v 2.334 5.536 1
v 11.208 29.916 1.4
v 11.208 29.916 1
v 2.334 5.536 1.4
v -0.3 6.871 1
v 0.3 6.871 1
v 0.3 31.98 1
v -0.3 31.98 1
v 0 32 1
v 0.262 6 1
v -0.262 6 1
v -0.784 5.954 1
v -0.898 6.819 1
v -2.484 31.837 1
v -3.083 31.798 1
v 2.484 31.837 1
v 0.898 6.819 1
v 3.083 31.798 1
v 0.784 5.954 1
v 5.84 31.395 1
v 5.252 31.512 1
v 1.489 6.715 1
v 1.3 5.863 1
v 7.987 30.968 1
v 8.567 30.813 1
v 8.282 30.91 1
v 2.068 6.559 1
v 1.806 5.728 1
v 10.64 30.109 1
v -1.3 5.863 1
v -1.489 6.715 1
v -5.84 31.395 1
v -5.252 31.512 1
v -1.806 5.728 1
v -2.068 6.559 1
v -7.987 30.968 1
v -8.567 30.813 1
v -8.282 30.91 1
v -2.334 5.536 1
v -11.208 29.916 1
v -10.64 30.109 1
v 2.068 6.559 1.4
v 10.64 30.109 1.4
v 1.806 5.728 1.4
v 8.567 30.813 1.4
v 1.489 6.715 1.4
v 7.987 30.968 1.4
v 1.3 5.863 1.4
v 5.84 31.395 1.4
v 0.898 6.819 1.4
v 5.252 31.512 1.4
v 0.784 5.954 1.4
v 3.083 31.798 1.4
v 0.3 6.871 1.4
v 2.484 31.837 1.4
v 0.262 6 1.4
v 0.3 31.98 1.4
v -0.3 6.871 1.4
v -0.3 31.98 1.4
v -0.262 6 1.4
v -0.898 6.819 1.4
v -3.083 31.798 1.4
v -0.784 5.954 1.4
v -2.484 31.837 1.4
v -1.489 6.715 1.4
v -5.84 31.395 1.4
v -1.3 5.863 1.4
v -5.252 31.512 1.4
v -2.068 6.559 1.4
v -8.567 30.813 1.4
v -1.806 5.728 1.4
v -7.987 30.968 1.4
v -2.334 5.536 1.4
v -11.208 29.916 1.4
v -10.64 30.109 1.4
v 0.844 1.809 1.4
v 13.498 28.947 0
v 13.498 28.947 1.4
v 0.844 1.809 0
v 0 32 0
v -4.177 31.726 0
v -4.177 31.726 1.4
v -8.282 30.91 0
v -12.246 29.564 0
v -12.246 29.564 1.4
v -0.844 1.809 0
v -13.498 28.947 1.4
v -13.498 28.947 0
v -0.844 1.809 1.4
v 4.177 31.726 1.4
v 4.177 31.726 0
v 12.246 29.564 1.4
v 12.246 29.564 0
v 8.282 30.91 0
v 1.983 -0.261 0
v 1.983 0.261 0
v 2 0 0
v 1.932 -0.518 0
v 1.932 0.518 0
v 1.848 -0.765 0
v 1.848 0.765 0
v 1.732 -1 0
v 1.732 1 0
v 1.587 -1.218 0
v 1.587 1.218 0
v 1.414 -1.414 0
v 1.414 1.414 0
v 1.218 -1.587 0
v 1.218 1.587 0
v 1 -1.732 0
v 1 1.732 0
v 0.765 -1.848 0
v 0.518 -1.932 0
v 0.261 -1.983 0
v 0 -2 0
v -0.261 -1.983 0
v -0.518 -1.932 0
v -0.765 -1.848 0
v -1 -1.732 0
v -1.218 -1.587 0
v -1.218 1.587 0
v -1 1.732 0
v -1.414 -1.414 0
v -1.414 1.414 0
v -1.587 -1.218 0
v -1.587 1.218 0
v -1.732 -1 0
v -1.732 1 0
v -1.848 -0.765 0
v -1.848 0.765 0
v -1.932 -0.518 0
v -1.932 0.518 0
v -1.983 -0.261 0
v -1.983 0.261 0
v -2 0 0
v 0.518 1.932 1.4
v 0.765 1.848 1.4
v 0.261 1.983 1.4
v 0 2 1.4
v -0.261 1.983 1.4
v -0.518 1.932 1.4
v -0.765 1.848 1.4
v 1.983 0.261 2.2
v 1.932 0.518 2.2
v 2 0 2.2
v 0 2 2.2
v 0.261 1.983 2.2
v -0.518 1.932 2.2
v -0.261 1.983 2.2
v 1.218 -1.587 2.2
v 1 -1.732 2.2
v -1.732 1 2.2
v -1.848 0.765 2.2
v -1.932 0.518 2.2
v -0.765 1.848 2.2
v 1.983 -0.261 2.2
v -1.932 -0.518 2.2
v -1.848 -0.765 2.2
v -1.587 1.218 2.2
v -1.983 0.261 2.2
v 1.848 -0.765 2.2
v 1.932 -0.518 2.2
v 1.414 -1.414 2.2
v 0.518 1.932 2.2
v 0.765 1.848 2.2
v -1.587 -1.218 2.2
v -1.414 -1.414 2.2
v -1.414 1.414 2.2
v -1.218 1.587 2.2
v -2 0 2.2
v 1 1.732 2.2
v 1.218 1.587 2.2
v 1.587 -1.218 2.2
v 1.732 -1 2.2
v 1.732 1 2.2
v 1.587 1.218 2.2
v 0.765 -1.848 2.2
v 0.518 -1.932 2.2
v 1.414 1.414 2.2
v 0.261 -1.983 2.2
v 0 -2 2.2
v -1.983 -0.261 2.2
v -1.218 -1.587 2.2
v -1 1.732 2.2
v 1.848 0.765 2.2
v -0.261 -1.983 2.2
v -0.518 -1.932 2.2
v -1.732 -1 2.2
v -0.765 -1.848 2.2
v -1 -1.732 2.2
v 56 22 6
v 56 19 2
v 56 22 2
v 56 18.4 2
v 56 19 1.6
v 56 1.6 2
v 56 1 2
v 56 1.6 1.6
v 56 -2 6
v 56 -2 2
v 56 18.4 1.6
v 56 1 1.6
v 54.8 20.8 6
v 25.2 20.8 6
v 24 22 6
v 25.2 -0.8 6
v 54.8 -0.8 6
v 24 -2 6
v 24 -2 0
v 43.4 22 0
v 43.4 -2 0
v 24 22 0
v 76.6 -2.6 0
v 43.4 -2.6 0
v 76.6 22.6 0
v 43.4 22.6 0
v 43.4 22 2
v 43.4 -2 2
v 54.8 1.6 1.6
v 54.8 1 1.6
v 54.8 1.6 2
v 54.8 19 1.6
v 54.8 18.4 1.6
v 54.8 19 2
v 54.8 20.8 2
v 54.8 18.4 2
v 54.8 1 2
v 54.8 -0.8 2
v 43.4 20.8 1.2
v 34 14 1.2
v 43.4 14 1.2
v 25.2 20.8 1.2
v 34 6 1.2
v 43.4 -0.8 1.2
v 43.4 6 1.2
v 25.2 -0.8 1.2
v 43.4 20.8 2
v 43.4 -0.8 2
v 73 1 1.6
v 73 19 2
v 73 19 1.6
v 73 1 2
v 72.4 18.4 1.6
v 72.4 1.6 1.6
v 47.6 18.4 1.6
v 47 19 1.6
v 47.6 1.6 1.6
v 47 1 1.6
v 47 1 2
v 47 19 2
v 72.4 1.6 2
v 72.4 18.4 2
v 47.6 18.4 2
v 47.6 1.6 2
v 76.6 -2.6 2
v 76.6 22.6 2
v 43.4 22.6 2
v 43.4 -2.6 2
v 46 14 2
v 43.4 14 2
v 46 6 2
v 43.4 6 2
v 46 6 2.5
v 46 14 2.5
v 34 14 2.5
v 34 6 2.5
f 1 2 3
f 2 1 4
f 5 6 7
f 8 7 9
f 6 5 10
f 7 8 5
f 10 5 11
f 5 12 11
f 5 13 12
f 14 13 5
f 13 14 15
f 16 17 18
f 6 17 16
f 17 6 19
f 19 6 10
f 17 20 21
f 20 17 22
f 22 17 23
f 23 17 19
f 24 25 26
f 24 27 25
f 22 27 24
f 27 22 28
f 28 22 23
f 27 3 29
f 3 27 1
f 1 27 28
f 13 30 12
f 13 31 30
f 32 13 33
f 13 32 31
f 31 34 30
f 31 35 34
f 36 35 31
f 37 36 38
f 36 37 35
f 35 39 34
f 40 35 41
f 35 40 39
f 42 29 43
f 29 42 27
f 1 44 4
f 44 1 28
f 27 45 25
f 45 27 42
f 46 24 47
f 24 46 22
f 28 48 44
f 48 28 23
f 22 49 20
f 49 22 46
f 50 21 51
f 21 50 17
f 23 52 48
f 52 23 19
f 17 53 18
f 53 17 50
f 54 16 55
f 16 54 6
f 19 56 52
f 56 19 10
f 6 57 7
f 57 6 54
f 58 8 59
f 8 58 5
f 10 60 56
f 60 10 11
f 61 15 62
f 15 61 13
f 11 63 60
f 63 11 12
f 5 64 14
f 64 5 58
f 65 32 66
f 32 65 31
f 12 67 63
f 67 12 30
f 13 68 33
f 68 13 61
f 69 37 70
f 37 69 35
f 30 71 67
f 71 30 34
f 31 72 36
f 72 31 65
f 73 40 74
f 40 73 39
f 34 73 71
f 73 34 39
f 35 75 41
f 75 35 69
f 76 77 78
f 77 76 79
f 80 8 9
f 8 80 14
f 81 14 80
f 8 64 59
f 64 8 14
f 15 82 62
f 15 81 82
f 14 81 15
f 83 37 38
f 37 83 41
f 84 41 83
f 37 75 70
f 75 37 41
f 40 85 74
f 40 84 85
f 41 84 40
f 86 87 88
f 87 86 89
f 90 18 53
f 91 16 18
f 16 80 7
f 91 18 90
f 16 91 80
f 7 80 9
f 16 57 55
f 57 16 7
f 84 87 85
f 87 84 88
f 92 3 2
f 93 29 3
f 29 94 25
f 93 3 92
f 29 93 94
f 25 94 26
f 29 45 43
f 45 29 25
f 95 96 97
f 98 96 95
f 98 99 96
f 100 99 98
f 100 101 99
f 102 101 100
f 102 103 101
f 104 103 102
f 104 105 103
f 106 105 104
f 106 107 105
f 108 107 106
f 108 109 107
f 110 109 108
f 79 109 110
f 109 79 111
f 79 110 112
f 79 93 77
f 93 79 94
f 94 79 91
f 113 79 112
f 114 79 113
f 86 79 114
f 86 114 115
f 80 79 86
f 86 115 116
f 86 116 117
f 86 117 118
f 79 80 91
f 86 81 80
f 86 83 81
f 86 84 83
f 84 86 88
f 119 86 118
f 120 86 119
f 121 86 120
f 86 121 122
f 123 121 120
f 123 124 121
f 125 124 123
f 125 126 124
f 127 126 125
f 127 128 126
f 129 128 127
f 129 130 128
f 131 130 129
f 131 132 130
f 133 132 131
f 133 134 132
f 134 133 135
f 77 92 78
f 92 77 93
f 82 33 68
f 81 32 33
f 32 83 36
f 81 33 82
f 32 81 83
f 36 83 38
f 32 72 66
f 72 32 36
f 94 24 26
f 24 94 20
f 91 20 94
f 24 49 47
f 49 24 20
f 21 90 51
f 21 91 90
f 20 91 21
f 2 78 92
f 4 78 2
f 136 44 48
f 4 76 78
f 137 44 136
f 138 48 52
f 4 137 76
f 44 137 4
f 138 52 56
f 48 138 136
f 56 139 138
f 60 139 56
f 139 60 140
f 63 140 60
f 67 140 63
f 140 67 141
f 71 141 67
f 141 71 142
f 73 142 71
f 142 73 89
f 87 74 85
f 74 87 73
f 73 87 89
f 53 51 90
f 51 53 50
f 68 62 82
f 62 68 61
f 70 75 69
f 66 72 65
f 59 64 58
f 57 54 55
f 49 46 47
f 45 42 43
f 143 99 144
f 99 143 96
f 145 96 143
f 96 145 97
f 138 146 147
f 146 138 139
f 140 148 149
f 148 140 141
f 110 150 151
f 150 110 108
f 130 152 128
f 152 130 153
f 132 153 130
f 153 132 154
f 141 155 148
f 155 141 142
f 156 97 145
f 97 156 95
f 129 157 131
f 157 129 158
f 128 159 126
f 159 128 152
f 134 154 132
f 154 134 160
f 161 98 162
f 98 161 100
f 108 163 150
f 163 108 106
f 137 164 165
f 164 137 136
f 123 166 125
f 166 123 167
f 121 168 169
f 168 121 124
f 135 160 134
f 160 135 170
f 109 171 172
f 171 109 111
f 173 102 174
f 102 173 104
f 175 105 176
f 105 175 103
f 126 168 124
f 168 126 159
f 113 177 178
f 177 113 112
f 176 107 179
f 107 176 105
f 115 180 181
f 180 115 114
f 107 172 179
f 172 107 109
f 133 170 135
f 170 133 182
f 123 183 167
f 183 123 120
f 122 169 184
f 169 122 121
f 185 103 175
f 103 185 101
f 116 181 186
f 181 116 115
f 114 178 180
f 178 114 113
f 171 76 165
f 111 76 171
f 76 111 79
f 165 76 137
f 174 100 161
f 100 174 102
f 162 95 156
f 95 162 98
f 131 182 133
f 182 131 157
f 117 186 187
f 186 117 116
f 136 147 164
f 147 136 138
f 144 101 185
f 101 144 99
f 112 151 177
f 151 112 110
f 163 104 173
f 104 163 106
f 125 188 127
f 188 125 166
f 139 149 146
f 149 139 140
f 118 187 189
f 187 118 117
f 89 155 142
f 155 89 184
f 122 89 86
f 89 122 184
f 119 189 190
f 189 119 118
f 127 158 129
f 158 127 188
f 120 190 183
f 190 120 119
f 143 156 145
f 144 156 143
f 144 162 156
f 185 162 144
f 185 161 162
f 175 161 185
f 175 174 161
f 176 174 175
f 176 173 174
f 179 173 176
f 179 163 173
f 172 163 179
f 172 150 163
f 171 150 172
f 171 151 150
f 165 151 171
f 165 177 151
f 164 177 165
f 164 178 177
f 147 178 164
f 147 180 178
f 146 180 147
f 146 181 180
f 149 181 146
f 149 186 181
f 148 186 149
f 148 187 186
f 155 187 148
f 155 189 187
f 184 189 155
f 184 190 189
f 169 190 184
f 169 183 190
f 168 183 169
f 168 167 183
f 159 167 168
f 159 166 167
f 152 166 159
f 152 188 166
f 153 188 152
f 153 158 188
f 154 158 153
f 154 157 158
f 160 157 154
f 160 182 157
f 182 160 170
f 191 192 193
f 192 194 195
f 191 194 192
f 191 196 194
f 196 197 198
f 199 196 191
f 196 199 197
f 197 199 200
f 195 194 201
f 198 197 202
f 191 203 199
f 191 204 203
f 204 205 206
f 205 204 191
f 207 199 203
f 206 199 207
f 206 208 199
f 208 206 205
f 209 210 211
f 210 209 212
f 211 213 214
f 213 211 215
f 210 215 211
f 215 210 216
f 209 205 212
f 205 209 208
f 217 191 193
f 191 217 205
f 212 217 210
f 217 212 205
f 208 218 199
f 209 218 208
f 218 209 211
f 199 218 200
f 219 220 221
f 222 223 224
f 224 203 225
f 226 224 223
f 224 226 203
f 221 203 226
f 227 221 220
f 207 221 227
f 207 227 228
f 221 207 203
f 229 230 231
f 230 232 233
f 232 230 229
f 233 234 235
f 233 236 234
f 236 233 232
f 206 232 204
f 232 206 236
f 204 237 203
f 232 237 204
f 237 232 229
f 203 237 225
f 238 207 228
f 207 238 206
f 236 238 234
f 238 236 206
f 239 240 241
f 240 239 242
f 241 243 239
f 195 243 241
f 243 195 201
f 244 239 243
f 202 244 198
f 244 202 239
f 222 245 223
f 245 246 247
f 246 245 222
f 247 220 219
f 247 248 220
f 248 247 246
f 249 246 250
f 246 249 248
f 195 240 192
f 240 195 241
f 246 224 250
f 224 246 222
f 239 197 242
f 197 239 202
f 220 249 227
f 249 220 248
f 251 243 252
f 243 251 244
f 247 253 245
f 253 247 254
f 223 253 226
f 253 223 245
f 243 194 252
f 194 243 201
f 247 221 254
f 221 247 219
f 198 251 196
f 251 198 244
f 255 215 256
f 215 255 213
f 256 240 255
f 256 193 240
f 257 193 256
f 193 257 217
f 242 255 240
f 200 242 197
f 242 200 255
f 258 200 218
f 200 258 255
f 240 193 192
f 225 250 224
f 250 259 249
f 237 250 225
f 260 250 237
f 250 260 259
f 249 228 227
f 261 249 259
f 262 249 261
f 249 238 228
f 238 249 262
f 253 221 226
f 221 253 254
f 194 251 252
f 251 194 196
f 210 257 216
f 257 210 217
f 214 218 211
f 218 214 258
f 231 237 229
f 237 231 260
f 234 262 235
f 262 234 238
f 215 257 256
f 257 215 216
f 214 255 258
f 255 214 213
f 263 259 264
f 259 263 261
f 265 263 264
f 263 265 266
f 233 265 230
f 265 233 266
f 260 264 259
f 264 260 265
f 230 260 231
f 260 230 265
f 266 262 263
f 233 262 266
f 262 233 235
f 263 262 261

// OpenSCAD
// 小物：檜扇（ひおうぎ、男性用は白木・飾りなし）と硯箱（すずりばこ）
part = "plate";  // "hiougi" | "suzuribako" | "plate"

$fn = 48;

// 少し開いた檜扇（扇形、板の筋入り）。袖の前に貼る
module hiougi() {
  R = 32; ANG = 50; T = 1.4;
  difference() {
    linear_extrude(T) intersection() {
      circle(R);
      polygon([[0, 0], [R * 2 * sin(-ANG / 2), R * 2 * cos(ANG / 2)], [R * 2 * sin(ANG / 2), R * 2 * cos(ANG / 2)]]);
    }
    for (a = [-ANG / 2 + 5 : 5 : ANG / 2 - 5]) rotate([0, 0, a]) translate([-0.3, 6, T - 0.4]) cube([0.6, R, 1]);
  }
  cylinder(d = 4, h = T + 0.8);  // 要（かなめ）
}

module suzuribako() {
  W = 32; D = 24; H = 6;
  difference() {
    translate([-W / 2, -D / 2, 0]) cube([W, D, H]);
    translate([-W / 2 + 1.2, -D / 2 + 1.2, 1.2]) cube([W - 2.4, D - 2.4, H]);
  }
  translate([-6, -4, 0]) cube([12, 8, 2.5]);  // 硯
  // 蓋（ずらして載せる）
  translate([W / 2 + 4, 0, 0]) difference() {
    translate([-W / 2 - 0.6, -D / 2 - 0.6, 0]) cube([W + 1.2, D + 1.2, 2]);
    translate([-W / 2 + 3, -D / 2 + 3, 1.6]) difference() {   // 蒔絵の金線を描く溝
      cube([W - 6, D - 6, 1]);
      translate([0.6, 0.6, -1]) cube([W - 7.2, D - 7.2, 3]);
    }
  }
}

if (part == "hiougi") hiougi();
else if (part == "suzuribako") suzuribako();
else { hiougi(); translate([40, 10, 0]) suzuribako(); }
